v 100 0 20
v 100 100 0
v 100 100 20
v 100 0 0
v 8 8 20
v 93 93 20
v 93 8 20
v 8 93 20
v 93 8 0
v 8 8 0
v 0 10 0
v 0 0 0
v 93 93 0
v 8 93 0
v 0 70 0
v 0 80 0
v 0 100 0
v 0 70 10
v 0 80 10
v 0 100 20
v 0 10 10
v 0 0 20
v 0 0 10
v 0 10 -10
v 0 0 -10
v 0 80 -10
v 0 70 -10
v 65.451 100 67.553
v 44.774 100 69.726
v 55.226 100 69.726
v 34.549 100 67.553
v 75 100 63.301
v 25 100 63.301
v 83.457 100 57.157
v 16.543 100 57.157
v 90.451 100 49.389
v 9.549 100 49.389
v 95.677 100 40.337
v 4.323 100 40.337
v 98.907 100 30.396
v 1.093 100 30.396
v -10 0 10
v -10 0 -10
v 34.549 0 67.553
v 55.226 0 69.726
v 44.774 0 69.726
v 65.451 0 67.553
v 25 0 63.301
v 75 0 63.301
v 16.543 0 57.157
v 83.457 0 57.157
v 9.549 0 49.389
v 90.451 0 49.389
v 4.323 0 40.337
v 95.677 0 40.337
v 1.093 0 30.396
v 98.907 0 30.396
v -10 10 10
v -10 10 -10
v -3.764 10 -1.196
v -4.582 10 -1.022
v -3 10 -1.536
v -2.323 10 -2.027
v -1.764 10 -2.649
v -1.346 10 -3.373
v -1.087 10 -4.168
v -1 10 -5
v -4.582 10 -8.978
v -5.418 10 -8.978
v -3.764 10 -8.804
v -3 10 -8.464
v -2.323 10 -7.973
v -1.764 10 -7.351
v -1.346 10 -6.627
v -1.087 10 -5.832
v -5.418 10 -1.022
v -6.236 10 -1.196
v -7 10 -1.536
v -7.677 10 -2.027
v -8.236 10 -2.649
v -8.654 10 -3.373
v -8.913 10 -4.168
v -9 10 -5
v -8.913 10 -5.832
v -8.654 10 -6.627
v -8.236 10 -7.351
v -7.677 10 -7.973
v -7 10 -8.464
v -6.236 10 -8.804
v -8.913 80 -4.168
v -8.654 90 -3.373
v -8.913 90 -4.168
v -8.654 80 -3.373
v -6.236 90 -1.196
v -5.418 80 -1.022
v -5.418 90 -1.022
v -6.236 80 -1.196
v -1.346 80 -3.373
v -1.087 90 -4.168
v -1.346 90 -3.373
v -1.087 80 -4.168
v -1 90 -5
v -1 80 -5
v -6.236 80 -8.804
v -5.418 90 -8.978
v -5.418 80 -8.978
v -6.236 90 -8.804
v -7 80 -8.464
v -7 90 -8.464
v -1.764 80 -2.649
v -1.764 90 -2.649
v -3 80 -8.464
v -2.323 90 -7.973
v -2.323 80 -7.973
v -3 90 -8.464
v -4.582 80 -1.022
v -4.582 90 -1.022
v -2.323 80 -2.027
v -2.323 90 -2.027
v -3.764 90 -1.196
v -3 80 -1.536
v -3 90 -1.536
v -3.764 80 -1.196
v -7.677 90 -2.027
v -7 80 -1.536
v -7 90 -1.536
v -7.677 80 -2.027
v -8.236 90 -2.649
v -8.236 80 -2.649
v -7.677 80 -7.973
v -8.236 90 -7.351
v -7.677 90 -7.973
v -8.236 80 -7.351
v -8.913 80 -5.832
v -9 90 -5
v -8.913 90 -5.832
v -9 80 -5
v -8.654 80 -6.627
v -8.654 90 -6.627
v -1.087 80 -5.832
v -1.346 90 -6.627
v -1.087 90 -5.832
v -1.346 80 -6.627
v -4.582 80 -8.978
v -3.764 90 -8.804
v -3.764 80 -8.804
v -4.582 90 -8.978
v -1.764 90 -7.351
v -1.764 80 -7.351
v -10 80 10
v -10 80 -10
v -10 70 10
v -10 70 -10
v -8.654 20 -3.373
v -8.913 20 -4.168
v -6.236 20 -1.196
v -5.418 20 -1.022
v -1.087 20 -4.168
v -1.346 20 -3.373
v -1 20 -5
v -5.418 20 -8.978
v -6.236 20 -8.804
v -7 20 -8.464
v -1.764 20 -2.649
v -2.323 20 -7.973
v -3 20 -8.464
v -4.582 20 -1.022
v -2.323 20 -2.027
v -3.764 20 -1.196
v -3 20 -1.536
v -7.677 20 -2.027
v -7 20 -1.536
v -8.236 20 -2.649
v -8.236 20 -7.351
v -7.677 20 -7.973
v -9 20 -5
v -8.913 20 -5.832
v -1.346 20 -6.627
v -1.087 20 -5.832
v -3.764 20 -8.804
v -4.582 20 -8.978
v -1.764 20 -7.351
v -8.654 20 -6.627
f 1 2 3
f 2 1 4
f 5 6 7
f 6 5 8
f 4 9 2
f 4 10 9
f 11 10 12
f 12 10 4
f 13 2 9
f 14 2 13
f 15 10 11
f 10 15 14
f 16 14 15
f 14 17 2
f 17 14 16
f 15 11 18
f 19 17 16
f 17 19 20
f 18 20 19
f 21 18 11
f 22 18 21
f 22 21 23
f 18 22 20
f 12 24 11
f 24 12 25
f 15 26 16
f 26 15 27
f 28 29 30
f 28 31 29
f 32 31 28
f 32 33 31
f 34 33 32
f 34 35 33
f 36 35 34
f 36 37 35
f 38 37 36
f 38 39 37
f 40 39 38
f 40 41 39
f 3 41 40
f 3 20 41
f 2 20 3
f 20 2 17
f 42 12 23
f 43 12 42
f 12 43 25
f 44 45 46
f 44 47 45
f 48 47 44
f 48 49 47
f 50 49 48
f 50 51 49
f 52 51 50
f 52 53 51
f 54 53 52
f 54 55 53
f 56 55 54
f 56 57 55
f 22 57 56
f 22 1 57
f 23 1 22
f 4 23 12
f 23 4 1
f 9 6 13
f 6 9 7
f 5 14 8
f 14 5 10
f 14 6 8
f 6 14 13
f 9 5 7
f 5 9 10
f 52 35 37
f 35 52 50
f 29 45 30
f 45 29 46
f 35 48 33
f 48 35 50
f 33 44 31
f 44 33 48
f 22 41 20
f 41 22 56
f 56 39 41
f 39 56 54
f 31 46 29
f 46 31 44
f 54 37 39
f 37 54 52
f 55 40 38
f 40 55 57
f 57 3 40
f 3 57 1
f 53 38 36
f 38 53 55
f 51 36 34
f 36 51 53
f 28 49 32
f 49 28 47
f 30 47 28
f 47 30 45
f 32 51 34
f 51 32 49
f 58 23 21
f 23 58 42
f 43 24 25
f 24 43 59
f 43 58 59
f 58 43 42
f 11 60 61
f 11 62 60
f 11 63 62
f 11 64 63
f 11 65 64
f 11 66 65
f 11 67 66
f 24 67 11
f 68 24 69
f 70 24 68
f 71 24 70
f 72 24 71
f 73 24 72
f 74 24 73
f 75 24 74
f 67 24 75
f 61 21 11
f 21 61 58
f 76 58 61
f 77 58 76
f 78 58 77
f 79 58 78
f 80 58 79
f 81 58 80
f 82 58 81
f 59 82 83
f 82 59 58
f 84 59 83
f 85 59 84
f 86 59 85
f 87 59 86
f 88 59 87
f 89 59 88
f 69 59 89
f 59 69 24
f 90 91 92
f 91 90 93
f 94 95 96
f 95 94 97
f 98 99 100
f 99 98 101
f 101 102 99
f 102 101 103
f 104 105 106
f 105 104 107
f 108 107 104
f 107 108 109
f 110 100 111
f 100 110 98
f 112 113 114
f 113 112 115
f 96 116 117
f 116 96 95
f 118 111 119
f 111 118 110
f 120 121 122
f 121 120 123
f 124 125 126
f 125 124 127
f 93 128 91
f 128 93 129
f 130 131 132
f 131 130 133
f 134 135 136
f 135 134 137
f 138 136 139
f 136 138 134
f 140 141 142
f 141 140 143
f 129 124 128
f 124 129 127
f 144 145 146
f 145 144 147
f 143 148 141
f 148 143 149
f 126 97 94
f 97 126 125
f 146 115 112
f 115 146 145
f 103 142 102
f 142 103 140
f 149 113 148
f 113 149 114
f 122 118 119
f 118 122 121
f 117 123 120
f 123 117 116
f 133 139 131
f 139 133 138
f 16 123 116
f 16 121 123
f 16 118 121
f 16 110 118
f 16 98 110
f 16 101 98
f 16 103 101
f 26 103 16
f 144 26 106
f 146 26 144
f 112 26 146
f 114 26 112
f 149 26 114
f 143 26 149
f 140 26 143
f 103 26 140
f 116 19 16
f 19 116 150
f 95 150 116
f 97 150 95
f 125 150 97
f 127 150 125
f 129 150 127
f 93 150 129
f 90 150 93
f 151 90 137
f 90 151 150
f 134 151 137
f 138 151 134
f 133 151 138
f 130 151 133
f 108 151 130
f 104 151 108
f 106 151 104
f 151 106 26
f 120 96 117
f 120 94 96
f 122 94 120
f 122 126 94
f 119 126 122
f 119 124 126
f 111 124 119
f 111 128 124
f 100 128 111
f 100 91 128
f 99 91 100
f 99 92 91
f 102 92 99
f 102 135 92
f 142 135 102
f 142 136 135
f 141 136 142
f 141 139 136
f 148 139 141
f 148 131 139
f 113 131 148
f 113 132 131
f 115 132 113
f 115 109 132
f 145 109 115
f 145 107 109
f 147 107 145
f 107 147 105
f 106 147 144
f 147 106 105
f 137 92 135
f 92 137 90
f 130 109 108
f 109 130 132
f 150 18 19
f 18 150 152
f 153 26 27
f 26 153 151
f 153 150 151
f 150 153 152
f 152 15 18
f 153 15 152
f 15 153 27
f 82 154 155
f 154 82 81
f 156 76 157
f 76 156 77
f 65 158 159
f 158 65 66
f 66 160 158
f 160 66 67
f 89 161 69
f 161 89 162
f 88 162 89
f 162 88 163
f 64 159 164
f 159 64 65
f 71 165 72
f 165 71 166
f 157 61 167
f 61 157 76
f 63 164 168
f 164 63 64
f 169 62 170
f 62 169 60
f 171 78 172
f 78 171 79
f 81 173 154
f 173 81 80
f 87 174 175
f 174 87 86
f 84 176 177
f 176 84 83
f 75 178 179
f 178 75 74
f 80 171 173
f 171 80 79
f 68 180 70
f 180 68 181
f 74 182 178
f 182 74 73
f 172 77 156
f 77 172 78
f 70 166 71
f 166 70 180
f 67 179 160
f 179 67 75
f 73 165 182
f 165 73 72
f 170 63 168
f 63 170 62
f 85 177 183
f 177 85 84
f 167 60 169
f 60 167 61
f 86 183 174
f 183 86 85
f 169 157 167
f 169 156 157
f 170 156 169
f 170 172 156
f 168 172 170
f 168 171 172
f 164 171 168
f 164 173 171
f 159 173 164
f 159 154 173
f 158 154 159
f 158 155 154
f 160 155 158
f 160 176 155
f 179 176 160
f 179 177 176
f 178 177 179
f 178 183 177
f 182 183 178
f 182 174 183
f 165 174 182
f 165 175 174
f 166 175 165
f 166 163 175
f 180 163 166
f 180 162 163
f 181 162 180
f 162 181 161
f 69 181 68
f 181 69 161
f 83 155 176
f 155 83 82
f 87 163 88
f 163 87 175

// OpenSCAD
$fn=30;
width=100;
depth=100;
height=20;
width1=85;
depth1=85;
height1=25;
width2=100;
depth2=100;
height2=100;
height3=100;
rayon3=50;
width4=10;
depth4=10;
height4=20;
height5=10;
rayon5=4;


//
//Empty space under the half cylinder
//
difference(){
cube([width,depth,height]);
translate([8,8,0])cube([width1,depth1,height1]);
}

//
//Half cylinder that makes the back portion of the lid
//
intersection(){	
translate([-50,20,20])translate([0,-20,0])cube([width2,depth2,height2]);
translate([50,100,20])rotate([90,0,0])cylinder(h=height3,r=rayon3);
}

//
//Half cylinder that makes the front portion of the lid
//
intersection(){	
translate([50,20,20])translate([0,-20,0]) cube([width2,depth2,height2]);
translate([50,100,20])rotate([90,0,0])cylinder(h=height3,r=rayon3);
}

//
//Cylinder makes part of the hinges on the left and cube makes the support from the hinge to the lid
//
translate([-10,0,-10])cube([width4,depth4,height4]);
translate([-5,90,-5])rotate([90,0,0])cylinder(h=height5,r=rayon5);

//
//Cylinder makes part of the hinges on the right and cube makes the support from the hinge to the lid
//
translate([-10,70,-10])cube([width4,depth4,height4]);
translate([-5,20,-5])rotate([90,0,0])cylinder(h=height5,r=rayon5);
